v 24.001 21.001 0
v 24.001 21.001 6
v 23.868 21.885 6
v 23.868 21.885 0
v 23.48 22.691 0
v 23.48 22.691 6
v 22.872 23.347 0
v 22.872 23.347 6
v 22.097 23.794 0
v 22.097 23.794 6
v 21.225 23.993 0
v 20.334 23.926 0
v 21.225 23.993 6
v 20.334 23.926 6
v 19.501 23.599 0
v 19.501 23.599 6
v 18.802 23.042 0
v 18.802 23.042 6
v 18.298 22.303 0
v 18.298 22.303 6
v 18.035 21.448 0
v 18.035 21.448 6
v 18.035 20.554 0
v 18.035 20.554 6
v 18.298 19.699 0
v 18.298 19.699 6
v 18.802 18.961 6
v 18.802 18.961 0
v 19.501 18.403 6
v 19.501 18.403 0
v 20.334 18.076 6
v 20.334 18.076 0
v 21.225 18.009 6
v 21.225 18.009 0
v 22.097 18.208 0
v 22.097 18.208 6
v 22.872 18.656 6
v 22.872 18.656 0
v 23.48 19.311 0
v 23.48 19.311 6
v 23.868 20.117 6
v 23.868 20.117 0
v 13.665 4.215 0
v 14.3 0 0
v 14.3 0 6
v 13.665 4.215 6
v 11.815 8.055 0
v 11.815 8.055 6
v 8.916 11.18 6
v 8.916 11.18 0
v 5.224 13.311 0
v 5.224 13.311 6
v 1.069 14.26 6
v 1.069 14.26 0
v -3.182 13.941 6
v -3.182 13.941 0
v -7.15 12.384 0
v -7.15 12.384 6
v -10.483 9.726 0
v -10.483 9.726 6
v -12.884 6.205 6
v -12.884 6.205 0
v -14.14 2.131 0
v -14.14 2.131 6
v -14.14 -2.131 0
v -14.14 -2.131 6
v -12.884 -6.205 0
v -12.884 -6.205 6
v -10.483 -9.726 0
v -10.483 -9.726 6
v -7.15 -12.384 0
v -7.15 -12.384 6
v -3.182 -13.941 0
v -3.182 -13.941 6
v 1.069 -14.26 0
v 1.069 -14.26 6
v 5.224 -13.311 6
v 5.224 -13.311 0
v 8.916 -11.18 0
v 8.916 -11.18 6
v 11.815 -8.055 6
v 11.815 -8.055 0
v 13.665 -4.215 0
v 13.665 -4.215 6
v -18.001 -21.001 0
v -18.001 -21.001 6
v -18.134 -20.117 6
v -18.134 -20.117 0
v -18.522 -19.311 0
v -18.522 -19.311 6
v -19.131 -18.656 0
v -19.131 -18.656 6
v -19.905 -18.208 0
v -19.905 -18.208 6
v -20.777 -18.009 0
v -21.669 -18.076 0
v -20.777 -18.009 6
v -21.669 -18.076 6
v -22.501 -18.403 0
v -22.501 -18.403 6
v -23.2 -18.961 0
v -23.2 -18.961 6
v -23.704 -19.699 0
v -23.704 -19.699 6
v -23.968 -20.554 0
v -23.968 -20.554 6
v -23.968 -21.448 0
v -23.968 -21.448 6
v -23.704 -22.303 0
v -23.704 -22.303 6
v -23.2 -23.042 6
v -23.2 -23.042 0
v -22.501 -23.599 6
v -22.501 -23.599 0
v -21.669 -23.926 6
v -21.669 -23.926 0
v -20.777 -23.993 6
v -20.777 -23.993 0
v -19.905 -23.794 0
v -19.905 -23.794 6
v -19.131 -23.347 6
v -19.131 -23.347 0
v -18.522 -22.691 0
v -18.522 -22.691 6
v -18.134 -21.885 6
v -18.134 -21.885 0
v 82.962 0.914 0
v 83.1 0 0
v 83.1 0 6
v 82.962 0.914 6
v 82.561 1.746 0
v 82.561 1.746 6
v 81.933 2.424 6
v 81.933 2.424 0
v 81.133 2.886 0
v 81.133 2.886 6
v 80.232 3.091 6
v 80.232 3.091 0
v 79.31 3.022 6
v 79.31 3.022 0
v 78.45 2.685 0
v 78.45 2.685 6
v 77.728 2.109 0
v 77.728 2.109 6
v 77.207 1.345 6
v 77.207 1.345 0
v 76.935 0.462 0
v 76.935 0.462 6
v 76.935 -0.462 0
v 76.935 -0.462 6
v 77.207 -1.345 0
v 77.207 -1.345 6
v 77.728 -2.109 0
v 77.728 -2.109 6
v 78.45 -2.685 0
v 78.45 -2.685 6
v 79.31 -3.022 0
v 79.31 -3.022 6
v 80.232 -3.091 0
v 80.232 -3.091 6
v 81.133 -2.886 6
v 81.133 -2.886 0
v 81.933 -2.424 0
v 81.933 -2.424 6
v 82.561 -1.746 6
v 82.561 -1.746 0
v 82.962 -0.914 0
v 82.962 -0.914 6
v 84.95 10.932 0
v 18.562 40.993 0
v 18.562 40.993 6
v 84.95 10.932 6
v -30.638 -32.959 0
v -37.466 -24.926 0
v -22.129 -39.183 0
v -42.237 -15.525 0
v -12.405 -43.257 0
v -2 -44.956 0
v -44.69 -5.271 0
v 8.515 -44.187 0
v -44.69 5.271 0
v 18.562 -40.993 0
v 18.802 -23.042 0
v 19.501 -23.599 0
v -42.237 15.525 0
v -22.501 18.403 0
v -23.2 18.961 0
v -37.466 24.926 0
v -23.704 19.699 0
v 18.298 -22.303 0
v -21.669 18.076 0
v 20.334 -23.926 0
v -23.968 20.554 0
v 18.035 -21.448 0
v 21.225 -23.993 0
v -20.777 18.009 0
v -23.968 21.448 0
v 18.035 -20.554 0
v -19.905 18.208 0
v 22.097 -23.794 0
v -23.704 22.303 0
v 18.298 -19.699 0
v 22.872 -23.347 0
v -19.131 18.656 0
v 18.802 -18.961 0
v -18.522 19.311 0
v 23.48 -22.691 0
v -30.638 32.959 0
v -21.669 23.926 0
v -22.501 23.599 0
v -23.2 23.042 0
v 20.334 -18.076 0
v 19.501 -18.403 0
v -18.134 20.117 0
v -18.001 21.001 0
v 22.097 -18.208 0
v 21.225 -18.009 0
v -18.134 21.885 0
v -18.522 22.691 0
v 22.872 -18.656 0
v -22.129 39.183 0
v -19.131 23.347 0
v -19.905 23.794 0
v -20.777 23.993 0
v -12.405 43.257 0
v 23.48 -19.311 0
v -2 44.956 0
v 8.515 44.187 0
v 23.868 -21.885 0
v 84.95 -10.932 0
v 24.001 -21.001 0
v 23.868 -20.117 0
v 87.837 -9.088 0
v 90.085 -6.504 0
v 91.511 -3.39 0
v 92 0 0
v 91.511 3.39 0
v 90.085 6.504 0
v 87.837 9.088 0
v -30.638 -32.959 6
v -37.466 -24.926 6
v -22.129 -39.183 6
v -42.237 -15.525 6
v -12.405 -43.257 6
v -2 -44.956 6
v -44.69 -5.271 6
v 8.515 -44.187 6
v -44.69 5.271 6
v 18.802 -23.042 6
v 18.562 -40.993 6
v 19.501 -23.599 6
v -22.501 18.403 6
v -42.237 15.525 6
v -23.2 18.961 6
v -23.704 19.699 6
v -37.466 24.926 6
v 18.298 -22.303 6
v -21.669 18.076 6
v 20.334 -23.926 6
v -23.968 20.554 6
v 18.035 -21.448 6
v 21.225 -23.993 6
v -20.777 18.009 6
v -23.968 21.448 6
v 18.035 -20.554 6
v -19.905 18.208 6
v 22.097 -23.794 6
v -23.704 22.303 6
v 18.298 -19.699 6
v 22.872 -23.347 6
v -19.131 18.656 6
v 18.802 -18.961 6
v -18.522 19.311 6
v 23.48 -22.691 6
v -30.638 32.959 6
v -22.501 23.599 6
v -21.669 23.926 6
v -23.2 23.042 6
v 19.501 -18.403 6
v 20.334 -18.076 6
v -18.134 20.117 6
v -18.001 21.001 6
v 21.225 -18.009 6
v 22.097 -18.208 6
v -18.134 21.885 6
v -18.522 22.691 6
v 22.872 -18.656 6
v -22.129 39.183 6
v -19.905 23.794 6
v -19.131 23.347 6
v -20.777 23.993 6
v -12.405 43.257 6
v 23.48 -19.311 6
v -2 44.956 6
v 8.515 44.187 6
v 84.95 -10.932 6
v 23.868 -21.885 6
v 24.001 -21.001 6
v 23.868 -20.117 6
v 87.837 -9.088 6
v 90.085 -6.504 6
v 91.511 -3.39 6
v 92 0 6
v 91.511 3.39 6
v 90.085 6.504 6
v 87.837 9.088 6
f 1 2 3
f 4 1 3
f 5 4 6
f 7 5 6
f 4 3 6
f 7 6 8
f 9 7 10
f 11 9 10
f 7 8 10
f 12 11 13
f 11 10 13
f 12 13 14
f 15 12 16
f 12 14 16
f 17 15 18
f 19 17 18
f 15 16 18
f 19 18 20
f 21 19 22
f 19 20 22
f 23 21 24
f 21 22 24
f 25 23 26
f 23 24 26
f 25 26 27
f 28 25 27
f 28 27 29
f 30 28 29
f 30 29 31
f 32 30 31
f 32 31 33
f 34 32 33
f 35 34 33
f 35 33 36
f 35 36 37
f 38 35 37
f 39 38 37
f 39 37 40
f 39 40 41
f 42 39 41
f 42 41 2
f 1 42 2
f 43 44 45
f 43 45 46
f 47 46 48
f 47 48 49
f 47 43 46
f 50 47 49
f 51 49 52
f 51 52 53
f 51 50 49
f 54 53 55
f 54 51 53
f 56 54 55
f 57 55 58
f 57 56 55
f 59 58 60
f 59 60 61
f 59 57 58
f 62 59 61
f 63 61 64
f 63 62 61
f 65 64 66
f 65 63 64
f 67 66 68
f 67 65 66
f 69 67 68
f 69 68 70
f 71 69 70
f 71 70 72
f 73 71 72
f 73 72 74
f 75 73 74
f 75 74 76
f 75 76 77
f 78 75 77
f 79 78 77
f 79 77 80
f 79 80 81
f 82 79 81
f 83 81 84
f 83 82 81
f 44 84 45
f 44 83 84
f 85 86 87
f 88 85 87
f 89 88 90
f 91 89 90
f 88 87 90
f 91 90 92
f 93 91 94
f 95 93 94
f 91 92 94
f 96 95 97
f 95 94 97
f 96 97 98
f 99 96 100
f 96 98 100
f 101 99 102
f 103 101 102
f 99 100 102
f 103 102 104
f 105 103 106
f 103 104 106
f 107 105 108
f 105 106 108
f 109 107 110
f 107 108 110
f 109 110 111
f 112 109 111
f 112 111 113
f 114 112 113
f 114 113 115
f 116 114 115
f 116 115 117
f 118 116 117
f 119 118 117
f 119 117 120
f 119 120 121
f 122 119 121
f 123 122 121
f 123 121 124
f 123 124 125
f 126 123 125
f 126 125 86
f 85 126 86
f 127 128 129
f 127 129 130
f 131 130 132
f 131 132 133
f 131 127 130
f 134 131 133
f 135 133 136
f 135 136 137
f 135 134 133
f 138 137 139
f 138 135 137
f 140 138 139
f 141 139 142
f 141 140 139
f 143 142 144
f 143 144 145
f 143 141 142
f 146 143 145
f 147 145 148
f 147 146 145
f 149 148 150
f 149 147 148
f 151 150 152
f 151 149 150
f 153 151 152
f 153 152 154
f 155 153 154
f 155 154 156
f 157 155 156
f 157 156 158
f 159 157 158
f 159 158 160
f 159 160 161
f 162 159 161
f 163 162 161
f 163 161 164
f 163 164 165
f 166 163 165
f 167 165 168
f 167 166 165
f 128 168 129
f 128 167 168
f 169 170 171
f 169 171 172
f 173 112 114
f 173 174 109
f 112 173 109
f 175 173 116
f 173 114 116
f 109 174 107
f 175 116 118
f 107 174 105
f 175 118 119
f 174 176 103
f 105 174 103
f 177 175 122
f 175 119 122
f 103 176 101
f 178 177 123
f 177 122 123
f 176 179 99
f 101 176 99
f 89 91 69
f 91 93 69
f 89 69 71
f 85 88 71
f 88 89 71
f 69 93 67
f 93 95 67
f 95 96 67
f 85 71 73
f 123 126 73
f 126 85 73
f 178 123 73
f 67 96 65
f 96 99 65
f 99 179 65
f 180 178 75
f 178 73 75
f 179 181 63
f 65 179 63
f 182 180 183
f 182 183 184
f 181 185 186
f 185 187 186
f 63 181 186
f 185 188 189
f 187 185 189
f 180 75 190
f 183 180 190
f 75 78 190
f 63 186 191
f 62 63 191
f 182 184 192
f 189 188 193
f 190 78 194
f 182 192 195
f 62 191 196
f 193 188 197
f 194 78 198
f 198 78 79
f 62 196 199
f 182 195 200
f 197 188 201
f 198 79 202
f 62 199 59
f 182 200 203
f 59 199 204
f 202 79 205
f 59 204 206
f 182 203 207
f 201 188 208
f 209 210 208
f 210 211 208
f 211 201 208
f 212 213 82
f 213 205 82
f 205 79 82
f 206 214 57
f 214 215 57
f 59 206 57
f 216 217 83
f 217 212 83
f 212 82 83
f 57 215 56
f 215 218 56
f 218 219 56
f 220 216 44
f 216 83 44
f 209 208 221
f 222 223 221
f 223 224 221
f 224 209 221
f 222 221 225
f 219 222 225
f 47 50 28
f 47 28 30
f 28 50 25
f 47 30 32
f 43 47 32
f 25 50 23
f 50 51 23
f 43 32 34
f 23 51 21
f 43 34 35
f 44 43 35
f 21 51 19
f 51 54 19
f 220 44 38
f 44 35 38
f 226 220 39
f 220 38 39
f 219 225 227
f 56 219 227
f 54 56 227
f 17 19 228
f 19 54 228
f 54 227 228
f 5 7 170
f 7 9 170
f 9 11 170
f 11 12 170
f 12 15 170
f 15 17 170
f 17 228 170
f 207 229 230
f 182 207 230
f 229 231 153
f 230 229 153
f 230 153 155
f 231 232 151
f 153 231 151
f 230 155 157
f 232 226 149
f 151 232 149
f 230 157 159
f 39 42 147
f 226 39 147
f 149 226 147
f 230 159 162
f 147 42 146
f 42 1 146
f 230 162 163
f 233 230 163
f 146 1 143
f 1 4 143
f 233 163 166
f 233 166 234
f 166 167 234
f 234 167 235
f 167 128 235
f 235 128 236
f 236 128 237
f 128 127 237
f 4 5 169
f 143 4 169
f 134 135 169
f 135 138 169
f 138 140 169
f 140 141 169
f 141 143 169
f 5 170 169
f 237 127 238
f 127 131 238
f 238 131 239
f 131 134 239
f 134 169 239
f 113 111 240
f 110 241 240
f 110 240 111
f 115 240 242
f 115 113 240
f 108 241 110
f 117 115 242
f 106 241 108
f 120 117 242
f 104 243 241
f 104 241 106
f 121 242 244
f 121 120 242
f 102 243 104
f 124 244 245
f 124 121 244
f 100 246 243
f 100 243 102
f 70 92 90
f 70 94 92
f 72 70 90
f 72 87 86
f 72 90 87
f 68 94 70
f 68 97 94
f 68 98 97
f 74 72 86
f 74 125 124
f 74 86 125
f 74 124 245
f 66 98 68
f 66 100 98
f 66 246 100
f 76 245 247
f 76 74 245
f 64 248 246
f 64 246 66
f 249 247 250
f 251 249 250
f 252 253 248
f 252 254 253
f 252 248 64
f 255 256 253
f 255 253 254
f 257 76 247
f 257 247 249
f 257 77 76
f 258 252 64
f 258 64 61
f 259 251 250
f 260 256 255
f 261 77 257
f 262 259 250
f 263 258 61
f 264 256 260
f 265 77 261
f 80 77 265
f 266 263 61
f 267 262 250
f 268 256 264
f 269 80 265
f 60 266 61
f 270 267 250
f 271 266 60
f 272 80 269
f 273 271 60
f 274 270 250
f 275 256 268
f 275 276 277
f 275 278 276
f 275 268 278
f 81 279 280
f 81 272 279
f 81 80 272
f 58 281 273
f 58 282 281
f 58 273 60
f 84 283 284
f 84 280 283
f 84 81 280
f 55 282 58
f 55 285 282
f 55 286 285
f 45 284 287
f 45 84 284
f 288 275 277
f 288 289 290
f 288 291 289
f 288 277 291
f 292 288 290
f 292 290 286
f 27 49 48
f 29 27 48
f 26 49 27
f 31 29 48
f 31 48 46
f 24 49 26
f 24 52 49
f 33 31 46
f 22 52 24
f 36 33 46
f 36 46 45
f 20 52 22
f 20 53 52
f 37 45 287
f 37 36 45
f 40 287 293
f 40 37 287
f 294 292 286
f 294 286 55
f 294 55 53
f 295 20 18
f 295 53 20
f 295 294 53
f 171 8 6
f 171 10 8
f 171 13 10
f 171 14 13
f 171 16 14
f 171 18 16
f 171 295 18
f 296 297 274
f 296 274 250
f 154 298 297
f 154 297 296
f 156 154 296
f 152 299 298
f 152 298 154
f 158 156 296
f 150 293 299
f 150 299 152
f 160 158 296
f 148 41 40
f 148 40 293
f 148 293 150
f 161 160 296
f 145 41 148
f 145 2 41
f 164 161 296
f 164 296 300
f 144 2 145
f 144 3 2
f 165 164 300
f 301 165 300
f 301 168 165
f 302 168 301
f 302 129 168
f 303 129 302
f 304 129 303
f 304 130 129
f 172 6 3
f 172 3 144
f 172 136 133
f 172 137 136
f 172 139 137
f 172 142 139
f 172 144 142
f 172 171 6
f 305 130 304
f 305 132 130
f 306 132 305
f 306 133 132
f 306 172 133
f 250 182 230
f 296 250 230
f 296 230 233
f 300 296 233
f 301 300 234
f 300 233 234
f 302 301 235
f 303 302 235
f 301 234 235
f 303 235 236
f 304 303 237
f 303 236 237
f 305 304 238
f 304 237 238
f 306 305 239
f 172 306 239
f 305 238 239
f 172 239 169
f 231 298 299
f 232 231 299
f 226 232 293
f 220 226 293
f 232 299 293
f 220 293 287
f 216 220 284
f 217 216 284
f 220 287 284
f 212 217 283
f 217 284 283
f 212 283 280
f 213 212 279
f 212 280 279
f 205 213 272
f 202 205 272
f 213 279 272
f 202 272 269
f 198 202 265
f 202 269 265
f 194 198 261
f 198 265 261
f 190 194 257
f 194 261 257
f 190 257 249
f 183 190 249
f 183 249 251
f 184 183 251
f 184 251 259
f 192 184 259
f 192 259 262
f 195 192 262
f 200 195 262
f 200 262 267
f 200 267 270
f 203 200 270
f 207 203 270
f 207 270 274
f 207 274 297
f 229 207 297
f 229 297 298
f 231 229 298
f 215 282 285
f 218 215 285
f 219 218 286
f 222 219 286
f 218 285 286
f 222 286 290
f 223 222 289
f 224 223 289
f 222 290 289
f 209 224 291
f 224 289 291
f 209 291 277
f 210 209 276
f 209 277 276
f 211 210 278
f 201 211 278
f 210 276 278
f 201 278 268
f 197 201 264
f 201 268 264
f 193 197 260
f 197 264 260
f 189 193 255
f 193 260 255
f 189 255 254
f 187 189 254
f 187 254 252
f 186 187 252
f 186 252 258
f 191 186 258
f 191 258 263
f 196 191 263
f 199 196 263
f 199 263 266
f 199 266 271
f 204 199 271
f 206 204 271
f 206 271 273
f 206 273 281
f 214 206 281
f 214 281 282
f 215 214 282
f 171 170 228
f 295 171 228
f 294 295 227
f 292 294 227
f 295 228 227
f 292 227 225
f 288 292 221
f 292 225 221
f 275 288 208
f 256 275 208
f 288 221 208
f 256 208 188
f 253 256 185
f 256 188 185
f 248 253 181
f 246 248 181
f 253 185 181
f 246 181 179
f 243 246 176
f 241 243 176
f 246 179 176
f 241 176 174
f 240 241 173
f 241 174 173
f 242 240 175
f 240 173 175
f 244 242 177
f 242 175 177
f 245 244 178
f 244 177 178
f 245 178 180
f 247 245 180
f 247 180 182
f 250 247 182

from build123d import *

# Parameters (mm, degrees)
SKETCH_R     = 14.3
SKETCH_R_2   = 3.1
PAD_DEPTH    = 6
SKETCH001_R  = 3
POCKET_DEPTH = 10


with BuildPart() as part:
    # Sketch → Pad (new body)
    with BuildSketch(Plane.XY):
        with BuildLine():
            ThreePointArc((18.562462, 40.993109), (-45, 0), (18.562462, -40.993109))
            Line((18.562462, -40.993109), (84.949967, -10.931506))
            ThreePointArc((84.949967, -10.931506), (92, 0), (84.949967, 10.931506))
            Line((18.562462, 40.993109), (84.949967, 10.931506))
        make_face()
        Circle(SKETCH_R, mode=Mode.SUBTRACT)
        with Locations((80, 0)):
            Circle(SKETCH_R_2, mode=Mode.SUBTRACT)
    extrude(amount=PAD_DEPTH)

    # Sketch001 → Pocket (cut)
    with BuildSketch(Plane.XY.offset(6)):
        with Locations((-21.001071, 21.001071)):
            Circle(SKETCH001_R)
        with Locations((21.001071, 21.001071)):
            Circle(SKETCH001_R)
        with Locations((-21.001071, -21.001071)):
            Circle(SKETCH001_R)
        with Locations((21.001071, -21.001071)):
            Circle(SKETCH001_R)
    extrude(amount=-POCKET_DEPTH, mode=Mode.SUBTRACT)


solid = part.part
